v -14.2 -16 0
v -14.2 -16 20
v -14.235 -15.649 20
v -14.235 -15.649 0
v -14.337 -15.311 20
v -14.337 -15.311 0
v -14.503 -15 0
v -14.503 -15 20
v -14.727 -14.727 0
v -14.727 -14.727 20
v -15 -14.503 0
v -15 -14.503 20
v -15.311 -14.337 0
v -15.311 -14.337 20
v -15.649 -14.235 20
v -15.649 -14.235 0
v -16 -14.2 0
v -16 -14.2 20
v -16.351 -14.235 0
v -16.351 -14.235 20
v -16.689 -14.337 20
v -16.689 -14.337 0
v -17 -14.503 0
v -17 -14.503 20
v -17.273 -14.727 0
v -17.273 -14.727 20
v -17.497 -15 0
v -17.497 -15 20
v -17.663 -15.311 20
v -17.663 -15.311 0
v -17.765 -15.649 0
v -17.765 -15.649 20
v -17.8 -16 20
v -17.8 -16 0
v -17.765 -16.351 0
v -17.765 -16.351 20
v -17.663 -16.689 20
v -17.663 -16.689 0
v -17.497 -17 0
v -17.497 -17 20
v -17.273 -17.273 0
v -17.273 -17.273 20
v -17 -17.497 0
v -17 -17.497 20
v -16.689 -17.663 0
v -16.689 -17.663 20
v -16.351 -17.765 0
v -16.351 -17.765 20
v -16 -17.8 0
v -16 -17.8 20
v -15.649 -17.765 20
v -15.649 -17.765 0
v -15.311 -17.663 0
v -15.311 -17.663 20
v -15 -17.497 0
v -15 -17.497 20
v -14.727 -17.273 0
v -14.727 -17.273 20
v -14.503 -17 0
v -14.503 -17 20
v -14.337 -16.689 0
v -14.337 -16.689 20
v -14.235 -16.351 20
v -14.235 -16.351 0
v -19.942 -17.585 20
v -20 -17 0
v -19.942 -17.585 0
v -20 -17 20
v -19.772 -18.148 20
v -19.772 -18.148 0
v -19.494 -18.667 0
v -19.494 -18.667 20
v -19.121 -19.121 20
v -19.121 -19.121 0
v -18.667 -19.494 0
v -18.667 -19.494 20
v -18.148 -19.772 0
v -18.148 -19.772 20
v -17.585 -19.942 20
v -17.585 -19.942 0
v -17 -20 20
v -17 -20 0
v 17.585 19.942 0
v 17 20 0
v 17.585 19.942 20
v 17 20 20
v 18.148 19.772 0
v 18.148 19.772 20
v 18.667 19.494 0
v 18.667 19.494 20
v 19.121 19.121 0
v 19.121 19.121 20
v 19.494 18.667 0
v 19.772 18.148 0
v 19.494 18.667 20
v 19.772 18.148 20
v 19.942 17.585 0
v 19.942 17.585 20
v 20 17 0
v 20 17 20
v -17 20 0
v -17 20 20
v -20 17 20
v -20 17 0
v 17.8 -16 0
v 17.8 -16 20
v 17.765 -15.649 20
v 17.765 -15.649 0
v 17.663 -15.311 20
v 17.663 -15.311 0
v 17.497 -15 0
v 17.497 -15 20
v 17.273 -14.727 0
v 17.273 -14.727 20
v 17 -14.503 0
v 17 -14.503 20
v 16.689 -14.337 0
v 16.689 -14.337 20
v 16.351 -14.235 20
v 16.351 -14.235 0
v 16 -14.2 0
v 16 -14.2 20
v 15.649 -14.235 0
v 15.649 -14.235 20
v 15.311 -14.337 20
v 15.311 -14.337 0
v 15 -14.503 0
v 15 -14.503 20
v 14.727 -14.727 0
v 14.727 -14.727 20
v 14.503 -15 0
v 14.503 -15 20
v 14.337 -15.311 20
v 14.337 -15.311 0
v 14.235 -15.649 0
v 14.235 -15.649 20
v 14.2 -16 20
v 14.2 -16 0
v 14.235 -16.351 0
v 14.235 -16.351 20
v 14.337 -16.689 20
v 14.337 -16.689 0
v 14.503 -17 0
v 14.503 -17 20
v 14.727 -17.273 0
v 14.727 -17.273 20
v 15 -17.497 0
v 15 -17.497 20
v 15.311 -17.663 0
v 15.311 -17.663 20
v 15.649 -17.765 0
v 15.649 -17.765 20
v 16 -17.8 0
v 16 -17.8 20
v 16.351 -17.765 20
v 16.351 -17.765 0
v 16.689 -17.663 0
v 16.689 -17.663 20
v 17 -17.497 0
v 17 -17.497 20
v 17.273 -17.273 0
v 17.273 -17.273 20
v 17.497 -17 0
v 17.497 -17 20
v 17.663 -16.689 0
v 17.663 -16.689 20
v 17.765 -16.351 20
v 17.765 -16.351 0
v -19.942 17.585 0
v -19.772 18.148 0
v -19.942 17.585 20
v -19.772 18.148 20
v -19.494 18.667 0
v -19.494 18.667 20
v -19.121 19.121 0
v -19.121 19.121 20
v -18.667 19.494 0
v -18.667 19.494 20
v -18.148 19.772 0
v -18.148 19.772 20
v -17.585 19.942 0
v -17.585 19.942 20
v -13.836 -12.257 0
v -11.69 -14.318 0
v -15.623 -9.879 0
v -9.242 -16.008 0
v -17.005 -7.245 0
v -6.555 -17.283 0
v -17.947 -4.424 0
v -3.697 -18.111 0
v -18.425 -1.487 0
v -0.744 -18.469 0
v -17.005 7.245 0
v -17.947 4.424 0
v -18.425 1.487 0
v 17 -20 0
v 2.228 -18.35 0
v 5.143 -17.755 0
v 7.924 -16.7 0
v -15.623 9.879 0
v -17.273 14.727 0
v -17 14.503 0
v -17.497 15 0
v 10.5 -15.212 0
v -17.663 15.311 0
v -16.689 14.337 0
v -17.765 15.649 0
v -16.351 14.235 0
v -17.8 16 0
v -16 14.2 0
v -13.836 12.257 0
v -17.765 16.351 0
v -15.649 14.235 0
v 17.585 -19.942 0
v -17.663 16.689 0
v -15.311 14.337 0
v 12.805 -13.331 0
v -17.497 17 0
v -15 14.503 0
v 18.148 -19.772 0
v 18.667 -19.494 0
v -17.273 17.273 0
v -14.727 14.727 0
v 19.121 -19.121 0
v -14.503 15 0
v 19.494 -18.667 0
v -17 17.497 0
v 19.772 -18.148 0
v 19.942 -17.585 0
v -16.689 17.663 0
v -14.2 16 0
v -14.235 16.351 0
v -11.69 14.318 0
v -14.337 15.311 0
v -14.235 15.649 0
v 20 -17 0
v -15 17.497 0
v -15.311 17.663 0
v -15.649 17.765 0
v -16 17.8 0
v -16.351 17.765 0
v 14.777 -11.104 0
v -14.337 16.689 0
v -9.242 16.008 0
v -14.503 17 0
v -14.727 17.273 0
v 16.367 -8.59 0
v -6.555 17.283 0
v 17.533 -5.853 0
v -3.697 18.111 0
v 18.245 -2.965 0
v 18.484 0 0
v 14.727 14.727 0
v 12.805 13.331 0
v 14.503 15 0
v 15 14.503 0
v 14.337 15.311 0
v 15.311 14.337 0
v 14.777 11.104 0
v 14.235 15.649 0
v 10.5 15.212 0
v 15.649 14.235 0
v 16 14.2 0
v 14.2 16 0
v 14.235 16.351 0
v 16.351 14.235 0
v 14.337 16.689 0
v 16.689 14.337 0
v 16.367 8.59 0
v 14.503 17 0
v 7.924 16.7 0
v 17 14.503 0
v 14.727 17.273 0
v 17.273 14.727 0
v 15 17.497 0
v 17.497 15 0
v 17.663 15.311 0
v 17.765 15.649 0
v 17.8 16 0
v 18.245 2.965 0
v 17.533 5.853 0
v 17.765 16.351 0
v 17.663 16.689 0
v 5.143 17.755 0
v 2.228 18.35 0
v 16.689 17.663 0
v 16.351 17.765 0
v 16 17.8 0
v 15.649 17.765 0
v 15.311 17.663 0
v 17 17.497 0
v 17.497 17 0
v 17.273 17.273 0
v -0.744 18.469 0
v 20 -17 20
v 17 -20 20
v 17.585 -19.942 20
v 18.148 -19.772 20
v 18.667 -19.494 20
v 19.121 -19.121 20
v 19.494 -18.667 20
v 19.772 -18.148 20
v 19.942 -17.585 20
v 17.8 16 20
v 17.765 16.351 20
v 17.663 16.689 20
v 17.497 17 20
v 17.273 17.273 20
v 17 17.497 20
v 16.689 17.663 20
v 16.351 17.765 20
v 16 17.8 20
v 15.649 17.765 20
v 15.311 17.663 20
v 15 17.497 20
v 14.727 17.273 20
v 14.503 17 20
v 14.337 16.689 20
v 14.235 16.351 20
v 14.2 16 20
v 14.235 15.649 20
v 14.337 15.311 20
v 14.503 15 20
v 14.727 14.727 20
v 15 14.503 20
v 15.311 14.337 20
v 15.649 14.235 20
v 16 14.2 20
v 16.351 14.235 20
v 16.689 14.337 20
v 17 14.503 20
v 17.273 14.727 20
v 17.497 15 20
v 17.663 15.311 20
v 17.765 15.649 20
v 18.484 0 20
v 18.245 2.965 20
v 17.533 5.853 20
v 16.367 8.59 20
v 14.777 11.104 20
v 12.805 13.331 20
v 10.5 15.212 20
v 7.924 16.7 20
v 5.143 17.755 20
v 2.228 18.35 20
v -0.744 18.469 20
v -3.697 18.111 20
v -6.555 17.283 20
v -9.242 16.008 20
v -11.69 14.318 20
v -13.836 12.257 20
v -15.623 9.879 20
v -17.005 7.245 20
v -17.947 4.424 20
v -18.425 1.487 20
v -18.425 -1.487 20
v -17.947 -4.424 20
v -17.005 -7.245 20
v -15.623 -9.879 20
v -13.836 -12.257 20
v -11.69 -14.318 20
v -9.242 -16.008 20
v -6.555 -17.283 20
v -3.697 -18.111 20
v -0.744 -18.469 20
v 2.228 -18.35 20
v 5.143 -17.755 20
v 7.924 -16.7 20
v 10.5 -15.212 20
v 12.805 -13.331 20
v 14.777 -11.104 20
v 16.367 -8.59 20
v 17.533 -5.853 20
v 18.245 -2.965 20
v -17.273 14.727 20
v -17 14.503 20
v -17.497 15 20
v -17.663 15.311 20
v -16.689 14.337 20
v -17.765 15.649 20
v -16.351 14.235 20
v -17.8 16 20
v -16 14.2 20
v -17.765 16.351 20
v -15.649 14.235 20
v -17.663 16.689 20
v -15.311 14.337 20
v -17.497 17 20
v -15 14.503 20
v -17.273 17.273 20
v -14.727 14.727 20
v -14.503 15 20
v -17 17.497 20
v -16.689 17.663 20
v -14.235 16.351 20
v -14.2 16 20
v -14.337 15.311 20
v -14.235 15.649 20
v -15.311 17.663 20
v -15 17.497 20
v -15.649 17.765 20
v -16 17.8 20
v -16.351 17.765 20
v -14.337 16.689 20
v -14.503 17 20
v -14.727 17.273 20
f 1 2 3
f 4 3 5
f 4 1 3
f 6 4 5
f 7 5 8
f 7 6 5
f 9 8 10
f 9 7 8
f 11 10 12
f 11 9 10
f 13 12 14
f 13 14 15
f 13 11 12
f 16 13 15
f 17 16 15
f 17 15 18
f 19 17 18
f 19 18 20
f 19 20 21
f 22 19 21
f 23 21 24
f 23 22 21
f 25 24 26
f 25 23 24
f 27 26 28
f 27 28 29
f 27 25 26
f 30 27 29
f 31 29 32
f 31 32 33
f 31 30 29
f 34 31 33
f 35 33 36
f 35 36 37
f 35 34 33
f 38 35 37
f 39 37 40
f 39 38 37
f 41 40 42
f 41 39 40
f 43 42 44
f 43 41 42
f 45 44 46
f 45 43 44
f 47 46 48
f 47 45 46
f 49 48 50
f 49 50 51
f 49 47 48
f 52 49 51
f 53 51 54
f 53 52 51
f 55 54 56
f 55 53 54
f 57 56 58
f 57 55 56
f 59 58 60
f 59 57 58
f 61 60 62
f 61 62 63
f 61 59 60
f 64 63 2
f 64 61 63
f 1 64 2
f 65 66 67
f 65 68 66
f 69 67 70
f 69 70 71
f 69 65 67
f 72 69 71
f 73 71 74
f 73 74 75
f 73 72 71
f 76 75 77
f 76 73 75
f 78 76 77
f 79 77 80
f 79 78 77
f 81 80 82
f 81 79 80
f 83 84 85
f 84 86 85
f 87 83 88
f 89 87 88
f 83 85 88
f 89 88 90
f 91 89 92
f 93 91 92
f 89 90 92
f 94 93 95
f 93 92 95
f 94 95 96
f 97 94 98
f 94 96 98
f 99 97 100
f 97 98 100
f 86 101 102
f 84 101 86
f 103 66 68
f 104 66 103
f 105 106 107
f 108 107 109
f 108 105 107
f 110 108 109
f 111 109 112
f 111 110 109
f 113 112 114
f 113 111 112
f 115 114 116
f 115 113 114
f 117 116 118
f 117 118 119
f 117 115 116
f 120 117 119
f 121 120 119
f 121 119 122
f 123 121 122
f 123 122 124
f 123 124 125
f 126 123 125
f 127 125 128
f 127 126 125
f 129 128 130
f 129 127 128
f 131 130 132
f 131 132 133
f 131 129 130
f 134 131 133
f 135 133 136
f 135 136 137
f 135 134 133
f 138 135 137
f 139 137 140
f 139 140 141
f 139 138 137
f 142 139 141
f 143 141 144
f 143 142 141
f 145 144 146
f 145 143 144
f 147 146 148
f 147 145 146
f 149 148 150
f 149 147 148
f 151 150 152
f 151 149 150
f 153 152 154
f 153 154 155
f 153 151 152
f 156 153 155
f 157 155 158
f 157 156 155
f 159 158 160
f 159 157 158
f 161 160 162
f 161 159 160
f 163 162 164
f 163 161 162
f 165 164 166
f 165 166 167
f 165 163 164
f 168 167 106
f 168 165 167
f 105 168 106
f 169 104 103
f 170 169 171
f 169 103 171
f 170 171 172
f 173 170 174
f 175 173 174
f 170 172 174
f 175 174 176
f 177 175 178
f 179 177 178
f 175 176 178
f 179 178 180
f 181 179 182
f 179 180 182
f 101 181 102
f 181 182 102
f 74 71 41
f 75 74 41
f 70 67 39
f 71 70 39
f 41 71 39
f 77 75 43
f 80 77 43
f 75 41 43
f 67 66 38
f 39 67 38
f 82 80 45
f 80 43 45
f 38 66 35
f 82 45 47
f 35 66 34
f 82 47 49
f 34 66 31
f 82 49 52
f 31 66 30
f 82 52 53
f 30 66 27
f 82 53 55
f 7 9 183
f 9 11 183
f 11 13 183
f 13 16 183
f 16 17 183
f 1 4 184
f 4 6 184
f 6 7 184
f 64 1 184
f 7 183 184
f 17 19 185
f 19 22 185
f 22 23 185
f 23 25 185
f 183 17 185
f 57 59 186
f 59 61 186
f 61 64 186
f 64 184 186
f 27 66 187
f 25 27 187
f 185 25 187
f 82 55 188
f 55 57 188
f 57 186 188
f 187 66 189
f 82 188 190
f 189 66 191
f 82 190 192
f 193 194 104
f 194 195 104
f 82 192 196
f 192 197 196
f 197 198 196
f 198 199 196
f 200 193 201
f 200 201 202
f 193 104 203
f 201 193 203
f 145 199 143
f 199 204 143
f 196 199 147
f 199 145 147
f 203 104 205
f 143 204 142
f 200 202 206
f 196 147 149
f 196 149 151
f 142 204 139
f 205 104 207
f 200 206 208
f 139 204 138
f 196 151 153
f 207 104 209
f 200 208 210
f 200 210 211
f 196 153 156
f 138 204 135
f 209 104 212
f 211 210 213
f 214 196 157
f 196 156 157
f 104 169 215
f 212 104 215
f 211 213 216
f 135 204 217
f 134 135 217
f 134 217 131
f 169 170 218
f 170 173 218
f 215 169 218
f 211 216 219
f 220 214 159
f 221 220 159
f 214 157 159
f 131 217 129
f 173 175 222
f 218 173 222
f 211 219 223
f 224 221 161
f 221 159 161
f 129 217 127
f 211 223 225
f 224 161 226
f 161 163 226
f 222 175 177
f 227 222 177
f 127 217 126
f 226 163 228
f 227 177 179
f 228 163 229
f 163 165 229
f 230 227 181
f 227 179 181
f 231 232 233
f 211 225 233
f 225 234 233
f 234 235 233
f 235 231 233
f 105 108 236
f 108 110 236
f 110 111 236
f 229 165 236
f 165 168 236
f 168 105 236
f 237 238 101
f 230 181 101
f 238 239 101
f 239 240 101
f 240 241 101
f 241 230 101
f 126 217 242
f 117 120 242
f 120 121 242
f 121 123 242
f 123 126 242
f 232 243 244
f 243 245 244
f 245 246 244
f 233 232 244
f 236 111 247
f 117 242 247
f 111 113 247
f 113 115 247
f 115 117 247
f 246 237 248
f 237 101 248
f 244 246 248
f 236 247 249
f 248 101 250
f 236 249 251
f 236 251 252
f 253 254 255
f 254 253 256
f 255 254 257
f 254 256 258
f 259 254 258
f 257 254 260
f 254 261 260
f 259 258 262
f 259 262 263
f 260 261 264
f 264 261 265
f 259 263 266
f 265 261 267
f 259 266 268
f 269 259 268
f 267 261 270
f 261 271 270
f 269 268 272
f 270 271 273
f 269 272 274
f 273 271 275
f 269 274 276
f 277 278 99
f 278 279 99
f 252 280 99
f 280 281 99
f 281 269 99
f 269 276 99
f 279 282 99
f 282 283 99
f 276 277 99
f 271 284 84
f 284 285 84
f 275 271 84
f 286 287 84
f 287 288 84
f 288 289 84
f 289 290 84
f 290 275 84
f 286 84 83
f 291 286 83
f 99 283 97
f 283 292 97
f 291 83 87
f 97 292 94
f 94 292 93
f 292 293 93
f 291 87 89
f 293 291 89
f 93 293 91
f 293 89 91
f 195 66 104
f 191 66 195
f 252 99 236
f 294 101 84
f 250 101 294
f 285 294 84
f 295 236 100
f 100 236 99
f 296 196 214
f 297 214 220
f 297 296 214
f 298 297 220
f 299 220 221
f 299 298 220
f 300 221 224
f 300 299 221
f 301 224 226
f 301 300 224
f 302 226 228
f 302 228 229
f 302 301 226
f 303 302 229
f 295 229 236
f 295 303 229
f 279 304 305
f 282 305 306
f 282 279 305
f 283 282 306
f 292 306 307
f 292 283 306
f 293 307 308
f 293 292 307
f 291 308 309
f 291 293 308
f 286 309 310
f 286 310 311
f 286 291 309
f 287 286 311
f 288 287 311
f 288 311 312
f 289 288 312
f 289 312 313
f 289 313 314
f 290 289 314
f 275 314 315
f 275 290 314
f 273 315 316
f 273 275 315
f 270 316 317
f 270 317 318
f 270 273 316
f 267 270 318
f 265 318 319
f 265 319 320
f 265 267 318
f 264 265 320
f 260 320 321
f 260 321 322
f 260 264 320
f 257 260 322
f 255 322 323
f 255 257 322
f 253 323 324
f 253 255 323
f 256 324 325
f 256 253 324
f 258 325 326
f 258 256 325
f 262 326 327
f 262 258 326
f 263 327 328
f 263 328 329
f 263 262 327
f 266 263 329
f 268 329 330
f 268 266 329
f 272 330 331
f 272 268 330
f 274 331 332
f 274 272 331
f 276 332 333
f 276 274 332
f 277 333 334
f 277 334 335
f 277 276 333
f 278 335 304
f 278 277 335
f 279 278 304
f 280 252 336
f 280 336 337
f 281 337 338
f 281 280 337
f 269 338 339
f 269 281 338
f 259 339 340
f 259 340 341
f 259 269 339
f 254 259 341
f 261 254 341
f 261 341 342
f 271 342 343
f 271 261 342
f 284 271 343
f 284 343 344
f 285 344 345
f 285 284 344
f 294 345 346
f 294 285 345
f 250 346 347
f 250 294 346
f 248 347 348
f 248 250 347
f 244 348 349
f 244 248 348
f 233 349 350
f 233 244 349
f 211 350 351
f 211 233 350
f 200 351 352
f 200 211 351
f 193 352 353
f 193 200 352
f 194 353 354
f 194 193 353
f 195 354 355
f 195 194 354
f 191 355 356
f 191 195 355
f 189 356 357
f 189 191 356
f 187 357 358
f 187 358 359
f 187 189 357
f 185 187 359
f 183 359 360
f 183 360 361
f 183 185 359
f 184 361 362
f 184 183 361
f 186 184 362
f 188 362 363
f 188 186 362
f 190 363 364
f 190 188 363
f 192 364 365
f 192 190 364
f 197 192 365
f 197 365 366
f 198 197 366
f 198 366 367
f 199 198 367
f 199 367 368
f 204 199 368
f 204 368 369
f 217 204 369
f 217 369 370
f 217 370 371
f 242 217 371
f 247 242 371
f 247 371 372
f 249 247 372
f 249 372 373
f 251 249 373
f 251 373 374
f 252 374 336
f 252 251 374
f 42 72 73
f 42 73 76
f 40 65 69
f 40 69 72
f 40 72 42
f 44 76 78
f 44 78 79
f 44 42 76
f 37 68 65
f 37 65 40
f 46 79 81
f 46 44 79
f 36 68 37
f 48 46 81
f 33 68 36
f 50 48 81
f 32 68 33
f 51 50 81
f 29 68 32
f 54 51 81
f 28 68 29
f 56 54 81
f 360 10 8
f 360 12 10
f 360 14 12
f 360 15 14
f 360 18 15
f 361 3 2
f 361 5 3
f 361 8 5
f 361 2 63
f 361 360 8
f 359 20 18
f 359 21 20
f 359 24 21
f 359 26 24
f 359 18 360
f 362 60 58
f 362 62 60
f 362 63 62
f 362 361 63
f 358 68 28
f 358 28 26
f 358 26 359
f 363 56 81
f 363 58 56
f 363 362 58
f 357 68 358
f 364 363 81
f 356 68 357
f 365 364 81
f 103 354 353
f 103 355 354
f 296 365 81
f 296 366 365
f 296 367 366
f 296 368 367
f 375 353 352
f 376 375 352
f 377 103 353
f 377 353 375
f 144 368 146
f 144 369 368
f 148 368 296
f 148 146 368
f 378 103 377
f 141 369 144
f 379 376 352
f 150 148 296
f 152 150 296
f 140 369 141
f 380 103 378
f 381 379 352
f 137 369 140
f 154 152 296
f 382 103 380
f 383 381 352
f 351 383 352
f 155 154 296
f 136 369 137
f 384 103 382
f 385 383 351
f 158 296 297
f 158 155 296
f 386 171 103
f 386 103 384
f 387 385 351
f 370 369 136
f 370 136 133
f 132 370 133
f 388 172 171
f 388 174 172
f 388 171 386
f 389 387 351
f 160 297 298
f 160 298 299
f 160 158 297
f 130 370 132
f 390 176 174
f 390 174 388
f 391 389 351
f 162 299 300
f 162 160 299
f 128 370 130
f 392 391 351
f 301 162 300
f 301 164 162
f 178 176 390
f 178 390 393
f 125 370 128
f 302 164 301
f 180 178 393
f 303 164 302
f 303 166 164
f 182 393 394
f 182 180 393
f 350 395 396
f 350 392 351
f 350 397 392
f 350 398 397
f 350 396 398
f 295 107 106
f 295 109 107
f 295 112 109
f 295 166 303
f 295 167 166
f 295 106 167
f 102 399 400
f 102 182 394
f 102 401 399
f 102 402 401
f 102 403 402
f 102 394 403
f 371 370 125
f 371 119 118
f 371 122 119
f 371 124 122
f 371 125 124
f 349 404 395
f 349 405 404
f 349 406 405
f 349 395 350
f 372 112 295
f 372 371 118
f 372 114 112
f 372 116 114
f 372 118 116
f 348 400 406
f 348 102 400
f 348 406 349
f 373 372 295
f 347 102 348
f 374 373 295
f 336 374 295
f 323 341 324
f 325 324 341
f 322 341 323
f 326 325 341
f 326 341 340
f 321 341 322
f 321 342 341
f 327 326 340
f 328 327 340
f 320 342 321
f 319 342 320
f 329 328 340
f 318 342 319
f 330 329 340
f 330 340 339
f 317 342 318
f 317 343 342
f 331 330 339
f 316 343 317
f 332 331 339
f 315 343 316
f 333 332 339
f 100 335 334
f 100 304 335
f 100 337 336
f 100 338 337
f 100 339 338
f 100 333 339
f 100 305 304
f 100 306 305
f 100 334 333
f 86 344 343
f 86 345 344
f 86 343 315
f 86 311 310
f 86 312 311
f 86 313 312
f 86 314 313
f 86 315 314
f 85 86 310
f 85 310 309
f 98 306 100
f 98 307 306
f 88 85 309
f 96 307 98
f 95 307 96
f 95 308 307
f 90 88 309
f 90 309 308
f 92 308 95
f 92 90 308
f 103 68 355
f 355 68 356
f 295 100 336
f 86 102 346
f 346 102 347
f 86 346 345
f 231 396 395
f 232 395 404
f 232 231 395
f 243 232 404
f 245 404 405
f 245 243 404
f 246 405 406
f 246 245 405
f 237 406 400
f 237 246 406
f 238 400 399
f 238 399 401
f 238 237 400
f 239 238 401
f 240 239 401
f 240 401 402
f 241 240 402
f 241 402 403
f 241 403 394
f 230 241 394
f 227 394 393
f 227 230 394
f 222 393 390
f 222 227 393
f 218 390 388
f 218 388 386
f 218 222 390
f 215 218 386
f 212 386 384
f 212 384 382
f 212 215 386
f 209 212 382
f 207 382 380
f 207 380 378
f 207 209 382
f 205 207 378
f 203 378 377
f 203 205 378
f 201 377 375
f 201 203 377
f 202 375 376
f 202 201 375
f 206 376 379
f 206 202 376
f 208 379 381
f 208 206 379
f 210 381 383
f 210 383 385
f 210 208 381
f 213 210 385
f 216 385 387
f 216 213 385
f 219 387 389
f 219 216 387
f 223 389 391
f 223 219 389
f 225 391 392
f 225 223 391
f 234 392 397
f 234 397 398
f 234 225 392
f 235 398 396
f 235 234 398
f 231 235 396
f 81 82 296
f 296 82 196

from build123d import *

# Parameters (mm, degrees)
SKETCH1_W           = 40
SKETCH1_H           = 40
SKETCH1_R           = 1.8
SKETCH1_R_2         = 18.484463189
BOSS_EXTRUDE1_DEPTH = 20
FILLET1_R           = 3


with BuildPart() as part:
    # Sketch1 → Boss-Extrude1 (new body)
    with BuildSketch(Plane.XY):
        Rectangle(SKETCH1_W, SKETCH1_H)
        with Locations((-16, 16)):
            Circle(SKETCH1_R, mode=Mode.SUBTRACT)
        with Locations((16, 16)):
            Circle(SKETCH1_R, mode=Mode.SUBTRACT)
        with Locations((16, -16)):
            Circle(SKETCH1_R, mode=Mode.SUBTRACT)
        with Locations((-16, -16)):
            Circle(SKETCH1_R, mode=Mode.SUBTRACT)
        Circle(SKETCH1_R_2, mode=Mode.SUBTRACT)
    extrude(amount=BOSS_EXTRUDE1_DEPTH)

    # Fillet1
    fillet1_edges = [part.edges().sort_by_distance(p)[0] for p in [
        (20, -20, 10),
        (-20, -20, 10),
        (-20, 20, 10),
        (20, 20, 10),
    ]]
    fillet(fillet1_edges, radius=FILLET1_R)


solid = part.part
